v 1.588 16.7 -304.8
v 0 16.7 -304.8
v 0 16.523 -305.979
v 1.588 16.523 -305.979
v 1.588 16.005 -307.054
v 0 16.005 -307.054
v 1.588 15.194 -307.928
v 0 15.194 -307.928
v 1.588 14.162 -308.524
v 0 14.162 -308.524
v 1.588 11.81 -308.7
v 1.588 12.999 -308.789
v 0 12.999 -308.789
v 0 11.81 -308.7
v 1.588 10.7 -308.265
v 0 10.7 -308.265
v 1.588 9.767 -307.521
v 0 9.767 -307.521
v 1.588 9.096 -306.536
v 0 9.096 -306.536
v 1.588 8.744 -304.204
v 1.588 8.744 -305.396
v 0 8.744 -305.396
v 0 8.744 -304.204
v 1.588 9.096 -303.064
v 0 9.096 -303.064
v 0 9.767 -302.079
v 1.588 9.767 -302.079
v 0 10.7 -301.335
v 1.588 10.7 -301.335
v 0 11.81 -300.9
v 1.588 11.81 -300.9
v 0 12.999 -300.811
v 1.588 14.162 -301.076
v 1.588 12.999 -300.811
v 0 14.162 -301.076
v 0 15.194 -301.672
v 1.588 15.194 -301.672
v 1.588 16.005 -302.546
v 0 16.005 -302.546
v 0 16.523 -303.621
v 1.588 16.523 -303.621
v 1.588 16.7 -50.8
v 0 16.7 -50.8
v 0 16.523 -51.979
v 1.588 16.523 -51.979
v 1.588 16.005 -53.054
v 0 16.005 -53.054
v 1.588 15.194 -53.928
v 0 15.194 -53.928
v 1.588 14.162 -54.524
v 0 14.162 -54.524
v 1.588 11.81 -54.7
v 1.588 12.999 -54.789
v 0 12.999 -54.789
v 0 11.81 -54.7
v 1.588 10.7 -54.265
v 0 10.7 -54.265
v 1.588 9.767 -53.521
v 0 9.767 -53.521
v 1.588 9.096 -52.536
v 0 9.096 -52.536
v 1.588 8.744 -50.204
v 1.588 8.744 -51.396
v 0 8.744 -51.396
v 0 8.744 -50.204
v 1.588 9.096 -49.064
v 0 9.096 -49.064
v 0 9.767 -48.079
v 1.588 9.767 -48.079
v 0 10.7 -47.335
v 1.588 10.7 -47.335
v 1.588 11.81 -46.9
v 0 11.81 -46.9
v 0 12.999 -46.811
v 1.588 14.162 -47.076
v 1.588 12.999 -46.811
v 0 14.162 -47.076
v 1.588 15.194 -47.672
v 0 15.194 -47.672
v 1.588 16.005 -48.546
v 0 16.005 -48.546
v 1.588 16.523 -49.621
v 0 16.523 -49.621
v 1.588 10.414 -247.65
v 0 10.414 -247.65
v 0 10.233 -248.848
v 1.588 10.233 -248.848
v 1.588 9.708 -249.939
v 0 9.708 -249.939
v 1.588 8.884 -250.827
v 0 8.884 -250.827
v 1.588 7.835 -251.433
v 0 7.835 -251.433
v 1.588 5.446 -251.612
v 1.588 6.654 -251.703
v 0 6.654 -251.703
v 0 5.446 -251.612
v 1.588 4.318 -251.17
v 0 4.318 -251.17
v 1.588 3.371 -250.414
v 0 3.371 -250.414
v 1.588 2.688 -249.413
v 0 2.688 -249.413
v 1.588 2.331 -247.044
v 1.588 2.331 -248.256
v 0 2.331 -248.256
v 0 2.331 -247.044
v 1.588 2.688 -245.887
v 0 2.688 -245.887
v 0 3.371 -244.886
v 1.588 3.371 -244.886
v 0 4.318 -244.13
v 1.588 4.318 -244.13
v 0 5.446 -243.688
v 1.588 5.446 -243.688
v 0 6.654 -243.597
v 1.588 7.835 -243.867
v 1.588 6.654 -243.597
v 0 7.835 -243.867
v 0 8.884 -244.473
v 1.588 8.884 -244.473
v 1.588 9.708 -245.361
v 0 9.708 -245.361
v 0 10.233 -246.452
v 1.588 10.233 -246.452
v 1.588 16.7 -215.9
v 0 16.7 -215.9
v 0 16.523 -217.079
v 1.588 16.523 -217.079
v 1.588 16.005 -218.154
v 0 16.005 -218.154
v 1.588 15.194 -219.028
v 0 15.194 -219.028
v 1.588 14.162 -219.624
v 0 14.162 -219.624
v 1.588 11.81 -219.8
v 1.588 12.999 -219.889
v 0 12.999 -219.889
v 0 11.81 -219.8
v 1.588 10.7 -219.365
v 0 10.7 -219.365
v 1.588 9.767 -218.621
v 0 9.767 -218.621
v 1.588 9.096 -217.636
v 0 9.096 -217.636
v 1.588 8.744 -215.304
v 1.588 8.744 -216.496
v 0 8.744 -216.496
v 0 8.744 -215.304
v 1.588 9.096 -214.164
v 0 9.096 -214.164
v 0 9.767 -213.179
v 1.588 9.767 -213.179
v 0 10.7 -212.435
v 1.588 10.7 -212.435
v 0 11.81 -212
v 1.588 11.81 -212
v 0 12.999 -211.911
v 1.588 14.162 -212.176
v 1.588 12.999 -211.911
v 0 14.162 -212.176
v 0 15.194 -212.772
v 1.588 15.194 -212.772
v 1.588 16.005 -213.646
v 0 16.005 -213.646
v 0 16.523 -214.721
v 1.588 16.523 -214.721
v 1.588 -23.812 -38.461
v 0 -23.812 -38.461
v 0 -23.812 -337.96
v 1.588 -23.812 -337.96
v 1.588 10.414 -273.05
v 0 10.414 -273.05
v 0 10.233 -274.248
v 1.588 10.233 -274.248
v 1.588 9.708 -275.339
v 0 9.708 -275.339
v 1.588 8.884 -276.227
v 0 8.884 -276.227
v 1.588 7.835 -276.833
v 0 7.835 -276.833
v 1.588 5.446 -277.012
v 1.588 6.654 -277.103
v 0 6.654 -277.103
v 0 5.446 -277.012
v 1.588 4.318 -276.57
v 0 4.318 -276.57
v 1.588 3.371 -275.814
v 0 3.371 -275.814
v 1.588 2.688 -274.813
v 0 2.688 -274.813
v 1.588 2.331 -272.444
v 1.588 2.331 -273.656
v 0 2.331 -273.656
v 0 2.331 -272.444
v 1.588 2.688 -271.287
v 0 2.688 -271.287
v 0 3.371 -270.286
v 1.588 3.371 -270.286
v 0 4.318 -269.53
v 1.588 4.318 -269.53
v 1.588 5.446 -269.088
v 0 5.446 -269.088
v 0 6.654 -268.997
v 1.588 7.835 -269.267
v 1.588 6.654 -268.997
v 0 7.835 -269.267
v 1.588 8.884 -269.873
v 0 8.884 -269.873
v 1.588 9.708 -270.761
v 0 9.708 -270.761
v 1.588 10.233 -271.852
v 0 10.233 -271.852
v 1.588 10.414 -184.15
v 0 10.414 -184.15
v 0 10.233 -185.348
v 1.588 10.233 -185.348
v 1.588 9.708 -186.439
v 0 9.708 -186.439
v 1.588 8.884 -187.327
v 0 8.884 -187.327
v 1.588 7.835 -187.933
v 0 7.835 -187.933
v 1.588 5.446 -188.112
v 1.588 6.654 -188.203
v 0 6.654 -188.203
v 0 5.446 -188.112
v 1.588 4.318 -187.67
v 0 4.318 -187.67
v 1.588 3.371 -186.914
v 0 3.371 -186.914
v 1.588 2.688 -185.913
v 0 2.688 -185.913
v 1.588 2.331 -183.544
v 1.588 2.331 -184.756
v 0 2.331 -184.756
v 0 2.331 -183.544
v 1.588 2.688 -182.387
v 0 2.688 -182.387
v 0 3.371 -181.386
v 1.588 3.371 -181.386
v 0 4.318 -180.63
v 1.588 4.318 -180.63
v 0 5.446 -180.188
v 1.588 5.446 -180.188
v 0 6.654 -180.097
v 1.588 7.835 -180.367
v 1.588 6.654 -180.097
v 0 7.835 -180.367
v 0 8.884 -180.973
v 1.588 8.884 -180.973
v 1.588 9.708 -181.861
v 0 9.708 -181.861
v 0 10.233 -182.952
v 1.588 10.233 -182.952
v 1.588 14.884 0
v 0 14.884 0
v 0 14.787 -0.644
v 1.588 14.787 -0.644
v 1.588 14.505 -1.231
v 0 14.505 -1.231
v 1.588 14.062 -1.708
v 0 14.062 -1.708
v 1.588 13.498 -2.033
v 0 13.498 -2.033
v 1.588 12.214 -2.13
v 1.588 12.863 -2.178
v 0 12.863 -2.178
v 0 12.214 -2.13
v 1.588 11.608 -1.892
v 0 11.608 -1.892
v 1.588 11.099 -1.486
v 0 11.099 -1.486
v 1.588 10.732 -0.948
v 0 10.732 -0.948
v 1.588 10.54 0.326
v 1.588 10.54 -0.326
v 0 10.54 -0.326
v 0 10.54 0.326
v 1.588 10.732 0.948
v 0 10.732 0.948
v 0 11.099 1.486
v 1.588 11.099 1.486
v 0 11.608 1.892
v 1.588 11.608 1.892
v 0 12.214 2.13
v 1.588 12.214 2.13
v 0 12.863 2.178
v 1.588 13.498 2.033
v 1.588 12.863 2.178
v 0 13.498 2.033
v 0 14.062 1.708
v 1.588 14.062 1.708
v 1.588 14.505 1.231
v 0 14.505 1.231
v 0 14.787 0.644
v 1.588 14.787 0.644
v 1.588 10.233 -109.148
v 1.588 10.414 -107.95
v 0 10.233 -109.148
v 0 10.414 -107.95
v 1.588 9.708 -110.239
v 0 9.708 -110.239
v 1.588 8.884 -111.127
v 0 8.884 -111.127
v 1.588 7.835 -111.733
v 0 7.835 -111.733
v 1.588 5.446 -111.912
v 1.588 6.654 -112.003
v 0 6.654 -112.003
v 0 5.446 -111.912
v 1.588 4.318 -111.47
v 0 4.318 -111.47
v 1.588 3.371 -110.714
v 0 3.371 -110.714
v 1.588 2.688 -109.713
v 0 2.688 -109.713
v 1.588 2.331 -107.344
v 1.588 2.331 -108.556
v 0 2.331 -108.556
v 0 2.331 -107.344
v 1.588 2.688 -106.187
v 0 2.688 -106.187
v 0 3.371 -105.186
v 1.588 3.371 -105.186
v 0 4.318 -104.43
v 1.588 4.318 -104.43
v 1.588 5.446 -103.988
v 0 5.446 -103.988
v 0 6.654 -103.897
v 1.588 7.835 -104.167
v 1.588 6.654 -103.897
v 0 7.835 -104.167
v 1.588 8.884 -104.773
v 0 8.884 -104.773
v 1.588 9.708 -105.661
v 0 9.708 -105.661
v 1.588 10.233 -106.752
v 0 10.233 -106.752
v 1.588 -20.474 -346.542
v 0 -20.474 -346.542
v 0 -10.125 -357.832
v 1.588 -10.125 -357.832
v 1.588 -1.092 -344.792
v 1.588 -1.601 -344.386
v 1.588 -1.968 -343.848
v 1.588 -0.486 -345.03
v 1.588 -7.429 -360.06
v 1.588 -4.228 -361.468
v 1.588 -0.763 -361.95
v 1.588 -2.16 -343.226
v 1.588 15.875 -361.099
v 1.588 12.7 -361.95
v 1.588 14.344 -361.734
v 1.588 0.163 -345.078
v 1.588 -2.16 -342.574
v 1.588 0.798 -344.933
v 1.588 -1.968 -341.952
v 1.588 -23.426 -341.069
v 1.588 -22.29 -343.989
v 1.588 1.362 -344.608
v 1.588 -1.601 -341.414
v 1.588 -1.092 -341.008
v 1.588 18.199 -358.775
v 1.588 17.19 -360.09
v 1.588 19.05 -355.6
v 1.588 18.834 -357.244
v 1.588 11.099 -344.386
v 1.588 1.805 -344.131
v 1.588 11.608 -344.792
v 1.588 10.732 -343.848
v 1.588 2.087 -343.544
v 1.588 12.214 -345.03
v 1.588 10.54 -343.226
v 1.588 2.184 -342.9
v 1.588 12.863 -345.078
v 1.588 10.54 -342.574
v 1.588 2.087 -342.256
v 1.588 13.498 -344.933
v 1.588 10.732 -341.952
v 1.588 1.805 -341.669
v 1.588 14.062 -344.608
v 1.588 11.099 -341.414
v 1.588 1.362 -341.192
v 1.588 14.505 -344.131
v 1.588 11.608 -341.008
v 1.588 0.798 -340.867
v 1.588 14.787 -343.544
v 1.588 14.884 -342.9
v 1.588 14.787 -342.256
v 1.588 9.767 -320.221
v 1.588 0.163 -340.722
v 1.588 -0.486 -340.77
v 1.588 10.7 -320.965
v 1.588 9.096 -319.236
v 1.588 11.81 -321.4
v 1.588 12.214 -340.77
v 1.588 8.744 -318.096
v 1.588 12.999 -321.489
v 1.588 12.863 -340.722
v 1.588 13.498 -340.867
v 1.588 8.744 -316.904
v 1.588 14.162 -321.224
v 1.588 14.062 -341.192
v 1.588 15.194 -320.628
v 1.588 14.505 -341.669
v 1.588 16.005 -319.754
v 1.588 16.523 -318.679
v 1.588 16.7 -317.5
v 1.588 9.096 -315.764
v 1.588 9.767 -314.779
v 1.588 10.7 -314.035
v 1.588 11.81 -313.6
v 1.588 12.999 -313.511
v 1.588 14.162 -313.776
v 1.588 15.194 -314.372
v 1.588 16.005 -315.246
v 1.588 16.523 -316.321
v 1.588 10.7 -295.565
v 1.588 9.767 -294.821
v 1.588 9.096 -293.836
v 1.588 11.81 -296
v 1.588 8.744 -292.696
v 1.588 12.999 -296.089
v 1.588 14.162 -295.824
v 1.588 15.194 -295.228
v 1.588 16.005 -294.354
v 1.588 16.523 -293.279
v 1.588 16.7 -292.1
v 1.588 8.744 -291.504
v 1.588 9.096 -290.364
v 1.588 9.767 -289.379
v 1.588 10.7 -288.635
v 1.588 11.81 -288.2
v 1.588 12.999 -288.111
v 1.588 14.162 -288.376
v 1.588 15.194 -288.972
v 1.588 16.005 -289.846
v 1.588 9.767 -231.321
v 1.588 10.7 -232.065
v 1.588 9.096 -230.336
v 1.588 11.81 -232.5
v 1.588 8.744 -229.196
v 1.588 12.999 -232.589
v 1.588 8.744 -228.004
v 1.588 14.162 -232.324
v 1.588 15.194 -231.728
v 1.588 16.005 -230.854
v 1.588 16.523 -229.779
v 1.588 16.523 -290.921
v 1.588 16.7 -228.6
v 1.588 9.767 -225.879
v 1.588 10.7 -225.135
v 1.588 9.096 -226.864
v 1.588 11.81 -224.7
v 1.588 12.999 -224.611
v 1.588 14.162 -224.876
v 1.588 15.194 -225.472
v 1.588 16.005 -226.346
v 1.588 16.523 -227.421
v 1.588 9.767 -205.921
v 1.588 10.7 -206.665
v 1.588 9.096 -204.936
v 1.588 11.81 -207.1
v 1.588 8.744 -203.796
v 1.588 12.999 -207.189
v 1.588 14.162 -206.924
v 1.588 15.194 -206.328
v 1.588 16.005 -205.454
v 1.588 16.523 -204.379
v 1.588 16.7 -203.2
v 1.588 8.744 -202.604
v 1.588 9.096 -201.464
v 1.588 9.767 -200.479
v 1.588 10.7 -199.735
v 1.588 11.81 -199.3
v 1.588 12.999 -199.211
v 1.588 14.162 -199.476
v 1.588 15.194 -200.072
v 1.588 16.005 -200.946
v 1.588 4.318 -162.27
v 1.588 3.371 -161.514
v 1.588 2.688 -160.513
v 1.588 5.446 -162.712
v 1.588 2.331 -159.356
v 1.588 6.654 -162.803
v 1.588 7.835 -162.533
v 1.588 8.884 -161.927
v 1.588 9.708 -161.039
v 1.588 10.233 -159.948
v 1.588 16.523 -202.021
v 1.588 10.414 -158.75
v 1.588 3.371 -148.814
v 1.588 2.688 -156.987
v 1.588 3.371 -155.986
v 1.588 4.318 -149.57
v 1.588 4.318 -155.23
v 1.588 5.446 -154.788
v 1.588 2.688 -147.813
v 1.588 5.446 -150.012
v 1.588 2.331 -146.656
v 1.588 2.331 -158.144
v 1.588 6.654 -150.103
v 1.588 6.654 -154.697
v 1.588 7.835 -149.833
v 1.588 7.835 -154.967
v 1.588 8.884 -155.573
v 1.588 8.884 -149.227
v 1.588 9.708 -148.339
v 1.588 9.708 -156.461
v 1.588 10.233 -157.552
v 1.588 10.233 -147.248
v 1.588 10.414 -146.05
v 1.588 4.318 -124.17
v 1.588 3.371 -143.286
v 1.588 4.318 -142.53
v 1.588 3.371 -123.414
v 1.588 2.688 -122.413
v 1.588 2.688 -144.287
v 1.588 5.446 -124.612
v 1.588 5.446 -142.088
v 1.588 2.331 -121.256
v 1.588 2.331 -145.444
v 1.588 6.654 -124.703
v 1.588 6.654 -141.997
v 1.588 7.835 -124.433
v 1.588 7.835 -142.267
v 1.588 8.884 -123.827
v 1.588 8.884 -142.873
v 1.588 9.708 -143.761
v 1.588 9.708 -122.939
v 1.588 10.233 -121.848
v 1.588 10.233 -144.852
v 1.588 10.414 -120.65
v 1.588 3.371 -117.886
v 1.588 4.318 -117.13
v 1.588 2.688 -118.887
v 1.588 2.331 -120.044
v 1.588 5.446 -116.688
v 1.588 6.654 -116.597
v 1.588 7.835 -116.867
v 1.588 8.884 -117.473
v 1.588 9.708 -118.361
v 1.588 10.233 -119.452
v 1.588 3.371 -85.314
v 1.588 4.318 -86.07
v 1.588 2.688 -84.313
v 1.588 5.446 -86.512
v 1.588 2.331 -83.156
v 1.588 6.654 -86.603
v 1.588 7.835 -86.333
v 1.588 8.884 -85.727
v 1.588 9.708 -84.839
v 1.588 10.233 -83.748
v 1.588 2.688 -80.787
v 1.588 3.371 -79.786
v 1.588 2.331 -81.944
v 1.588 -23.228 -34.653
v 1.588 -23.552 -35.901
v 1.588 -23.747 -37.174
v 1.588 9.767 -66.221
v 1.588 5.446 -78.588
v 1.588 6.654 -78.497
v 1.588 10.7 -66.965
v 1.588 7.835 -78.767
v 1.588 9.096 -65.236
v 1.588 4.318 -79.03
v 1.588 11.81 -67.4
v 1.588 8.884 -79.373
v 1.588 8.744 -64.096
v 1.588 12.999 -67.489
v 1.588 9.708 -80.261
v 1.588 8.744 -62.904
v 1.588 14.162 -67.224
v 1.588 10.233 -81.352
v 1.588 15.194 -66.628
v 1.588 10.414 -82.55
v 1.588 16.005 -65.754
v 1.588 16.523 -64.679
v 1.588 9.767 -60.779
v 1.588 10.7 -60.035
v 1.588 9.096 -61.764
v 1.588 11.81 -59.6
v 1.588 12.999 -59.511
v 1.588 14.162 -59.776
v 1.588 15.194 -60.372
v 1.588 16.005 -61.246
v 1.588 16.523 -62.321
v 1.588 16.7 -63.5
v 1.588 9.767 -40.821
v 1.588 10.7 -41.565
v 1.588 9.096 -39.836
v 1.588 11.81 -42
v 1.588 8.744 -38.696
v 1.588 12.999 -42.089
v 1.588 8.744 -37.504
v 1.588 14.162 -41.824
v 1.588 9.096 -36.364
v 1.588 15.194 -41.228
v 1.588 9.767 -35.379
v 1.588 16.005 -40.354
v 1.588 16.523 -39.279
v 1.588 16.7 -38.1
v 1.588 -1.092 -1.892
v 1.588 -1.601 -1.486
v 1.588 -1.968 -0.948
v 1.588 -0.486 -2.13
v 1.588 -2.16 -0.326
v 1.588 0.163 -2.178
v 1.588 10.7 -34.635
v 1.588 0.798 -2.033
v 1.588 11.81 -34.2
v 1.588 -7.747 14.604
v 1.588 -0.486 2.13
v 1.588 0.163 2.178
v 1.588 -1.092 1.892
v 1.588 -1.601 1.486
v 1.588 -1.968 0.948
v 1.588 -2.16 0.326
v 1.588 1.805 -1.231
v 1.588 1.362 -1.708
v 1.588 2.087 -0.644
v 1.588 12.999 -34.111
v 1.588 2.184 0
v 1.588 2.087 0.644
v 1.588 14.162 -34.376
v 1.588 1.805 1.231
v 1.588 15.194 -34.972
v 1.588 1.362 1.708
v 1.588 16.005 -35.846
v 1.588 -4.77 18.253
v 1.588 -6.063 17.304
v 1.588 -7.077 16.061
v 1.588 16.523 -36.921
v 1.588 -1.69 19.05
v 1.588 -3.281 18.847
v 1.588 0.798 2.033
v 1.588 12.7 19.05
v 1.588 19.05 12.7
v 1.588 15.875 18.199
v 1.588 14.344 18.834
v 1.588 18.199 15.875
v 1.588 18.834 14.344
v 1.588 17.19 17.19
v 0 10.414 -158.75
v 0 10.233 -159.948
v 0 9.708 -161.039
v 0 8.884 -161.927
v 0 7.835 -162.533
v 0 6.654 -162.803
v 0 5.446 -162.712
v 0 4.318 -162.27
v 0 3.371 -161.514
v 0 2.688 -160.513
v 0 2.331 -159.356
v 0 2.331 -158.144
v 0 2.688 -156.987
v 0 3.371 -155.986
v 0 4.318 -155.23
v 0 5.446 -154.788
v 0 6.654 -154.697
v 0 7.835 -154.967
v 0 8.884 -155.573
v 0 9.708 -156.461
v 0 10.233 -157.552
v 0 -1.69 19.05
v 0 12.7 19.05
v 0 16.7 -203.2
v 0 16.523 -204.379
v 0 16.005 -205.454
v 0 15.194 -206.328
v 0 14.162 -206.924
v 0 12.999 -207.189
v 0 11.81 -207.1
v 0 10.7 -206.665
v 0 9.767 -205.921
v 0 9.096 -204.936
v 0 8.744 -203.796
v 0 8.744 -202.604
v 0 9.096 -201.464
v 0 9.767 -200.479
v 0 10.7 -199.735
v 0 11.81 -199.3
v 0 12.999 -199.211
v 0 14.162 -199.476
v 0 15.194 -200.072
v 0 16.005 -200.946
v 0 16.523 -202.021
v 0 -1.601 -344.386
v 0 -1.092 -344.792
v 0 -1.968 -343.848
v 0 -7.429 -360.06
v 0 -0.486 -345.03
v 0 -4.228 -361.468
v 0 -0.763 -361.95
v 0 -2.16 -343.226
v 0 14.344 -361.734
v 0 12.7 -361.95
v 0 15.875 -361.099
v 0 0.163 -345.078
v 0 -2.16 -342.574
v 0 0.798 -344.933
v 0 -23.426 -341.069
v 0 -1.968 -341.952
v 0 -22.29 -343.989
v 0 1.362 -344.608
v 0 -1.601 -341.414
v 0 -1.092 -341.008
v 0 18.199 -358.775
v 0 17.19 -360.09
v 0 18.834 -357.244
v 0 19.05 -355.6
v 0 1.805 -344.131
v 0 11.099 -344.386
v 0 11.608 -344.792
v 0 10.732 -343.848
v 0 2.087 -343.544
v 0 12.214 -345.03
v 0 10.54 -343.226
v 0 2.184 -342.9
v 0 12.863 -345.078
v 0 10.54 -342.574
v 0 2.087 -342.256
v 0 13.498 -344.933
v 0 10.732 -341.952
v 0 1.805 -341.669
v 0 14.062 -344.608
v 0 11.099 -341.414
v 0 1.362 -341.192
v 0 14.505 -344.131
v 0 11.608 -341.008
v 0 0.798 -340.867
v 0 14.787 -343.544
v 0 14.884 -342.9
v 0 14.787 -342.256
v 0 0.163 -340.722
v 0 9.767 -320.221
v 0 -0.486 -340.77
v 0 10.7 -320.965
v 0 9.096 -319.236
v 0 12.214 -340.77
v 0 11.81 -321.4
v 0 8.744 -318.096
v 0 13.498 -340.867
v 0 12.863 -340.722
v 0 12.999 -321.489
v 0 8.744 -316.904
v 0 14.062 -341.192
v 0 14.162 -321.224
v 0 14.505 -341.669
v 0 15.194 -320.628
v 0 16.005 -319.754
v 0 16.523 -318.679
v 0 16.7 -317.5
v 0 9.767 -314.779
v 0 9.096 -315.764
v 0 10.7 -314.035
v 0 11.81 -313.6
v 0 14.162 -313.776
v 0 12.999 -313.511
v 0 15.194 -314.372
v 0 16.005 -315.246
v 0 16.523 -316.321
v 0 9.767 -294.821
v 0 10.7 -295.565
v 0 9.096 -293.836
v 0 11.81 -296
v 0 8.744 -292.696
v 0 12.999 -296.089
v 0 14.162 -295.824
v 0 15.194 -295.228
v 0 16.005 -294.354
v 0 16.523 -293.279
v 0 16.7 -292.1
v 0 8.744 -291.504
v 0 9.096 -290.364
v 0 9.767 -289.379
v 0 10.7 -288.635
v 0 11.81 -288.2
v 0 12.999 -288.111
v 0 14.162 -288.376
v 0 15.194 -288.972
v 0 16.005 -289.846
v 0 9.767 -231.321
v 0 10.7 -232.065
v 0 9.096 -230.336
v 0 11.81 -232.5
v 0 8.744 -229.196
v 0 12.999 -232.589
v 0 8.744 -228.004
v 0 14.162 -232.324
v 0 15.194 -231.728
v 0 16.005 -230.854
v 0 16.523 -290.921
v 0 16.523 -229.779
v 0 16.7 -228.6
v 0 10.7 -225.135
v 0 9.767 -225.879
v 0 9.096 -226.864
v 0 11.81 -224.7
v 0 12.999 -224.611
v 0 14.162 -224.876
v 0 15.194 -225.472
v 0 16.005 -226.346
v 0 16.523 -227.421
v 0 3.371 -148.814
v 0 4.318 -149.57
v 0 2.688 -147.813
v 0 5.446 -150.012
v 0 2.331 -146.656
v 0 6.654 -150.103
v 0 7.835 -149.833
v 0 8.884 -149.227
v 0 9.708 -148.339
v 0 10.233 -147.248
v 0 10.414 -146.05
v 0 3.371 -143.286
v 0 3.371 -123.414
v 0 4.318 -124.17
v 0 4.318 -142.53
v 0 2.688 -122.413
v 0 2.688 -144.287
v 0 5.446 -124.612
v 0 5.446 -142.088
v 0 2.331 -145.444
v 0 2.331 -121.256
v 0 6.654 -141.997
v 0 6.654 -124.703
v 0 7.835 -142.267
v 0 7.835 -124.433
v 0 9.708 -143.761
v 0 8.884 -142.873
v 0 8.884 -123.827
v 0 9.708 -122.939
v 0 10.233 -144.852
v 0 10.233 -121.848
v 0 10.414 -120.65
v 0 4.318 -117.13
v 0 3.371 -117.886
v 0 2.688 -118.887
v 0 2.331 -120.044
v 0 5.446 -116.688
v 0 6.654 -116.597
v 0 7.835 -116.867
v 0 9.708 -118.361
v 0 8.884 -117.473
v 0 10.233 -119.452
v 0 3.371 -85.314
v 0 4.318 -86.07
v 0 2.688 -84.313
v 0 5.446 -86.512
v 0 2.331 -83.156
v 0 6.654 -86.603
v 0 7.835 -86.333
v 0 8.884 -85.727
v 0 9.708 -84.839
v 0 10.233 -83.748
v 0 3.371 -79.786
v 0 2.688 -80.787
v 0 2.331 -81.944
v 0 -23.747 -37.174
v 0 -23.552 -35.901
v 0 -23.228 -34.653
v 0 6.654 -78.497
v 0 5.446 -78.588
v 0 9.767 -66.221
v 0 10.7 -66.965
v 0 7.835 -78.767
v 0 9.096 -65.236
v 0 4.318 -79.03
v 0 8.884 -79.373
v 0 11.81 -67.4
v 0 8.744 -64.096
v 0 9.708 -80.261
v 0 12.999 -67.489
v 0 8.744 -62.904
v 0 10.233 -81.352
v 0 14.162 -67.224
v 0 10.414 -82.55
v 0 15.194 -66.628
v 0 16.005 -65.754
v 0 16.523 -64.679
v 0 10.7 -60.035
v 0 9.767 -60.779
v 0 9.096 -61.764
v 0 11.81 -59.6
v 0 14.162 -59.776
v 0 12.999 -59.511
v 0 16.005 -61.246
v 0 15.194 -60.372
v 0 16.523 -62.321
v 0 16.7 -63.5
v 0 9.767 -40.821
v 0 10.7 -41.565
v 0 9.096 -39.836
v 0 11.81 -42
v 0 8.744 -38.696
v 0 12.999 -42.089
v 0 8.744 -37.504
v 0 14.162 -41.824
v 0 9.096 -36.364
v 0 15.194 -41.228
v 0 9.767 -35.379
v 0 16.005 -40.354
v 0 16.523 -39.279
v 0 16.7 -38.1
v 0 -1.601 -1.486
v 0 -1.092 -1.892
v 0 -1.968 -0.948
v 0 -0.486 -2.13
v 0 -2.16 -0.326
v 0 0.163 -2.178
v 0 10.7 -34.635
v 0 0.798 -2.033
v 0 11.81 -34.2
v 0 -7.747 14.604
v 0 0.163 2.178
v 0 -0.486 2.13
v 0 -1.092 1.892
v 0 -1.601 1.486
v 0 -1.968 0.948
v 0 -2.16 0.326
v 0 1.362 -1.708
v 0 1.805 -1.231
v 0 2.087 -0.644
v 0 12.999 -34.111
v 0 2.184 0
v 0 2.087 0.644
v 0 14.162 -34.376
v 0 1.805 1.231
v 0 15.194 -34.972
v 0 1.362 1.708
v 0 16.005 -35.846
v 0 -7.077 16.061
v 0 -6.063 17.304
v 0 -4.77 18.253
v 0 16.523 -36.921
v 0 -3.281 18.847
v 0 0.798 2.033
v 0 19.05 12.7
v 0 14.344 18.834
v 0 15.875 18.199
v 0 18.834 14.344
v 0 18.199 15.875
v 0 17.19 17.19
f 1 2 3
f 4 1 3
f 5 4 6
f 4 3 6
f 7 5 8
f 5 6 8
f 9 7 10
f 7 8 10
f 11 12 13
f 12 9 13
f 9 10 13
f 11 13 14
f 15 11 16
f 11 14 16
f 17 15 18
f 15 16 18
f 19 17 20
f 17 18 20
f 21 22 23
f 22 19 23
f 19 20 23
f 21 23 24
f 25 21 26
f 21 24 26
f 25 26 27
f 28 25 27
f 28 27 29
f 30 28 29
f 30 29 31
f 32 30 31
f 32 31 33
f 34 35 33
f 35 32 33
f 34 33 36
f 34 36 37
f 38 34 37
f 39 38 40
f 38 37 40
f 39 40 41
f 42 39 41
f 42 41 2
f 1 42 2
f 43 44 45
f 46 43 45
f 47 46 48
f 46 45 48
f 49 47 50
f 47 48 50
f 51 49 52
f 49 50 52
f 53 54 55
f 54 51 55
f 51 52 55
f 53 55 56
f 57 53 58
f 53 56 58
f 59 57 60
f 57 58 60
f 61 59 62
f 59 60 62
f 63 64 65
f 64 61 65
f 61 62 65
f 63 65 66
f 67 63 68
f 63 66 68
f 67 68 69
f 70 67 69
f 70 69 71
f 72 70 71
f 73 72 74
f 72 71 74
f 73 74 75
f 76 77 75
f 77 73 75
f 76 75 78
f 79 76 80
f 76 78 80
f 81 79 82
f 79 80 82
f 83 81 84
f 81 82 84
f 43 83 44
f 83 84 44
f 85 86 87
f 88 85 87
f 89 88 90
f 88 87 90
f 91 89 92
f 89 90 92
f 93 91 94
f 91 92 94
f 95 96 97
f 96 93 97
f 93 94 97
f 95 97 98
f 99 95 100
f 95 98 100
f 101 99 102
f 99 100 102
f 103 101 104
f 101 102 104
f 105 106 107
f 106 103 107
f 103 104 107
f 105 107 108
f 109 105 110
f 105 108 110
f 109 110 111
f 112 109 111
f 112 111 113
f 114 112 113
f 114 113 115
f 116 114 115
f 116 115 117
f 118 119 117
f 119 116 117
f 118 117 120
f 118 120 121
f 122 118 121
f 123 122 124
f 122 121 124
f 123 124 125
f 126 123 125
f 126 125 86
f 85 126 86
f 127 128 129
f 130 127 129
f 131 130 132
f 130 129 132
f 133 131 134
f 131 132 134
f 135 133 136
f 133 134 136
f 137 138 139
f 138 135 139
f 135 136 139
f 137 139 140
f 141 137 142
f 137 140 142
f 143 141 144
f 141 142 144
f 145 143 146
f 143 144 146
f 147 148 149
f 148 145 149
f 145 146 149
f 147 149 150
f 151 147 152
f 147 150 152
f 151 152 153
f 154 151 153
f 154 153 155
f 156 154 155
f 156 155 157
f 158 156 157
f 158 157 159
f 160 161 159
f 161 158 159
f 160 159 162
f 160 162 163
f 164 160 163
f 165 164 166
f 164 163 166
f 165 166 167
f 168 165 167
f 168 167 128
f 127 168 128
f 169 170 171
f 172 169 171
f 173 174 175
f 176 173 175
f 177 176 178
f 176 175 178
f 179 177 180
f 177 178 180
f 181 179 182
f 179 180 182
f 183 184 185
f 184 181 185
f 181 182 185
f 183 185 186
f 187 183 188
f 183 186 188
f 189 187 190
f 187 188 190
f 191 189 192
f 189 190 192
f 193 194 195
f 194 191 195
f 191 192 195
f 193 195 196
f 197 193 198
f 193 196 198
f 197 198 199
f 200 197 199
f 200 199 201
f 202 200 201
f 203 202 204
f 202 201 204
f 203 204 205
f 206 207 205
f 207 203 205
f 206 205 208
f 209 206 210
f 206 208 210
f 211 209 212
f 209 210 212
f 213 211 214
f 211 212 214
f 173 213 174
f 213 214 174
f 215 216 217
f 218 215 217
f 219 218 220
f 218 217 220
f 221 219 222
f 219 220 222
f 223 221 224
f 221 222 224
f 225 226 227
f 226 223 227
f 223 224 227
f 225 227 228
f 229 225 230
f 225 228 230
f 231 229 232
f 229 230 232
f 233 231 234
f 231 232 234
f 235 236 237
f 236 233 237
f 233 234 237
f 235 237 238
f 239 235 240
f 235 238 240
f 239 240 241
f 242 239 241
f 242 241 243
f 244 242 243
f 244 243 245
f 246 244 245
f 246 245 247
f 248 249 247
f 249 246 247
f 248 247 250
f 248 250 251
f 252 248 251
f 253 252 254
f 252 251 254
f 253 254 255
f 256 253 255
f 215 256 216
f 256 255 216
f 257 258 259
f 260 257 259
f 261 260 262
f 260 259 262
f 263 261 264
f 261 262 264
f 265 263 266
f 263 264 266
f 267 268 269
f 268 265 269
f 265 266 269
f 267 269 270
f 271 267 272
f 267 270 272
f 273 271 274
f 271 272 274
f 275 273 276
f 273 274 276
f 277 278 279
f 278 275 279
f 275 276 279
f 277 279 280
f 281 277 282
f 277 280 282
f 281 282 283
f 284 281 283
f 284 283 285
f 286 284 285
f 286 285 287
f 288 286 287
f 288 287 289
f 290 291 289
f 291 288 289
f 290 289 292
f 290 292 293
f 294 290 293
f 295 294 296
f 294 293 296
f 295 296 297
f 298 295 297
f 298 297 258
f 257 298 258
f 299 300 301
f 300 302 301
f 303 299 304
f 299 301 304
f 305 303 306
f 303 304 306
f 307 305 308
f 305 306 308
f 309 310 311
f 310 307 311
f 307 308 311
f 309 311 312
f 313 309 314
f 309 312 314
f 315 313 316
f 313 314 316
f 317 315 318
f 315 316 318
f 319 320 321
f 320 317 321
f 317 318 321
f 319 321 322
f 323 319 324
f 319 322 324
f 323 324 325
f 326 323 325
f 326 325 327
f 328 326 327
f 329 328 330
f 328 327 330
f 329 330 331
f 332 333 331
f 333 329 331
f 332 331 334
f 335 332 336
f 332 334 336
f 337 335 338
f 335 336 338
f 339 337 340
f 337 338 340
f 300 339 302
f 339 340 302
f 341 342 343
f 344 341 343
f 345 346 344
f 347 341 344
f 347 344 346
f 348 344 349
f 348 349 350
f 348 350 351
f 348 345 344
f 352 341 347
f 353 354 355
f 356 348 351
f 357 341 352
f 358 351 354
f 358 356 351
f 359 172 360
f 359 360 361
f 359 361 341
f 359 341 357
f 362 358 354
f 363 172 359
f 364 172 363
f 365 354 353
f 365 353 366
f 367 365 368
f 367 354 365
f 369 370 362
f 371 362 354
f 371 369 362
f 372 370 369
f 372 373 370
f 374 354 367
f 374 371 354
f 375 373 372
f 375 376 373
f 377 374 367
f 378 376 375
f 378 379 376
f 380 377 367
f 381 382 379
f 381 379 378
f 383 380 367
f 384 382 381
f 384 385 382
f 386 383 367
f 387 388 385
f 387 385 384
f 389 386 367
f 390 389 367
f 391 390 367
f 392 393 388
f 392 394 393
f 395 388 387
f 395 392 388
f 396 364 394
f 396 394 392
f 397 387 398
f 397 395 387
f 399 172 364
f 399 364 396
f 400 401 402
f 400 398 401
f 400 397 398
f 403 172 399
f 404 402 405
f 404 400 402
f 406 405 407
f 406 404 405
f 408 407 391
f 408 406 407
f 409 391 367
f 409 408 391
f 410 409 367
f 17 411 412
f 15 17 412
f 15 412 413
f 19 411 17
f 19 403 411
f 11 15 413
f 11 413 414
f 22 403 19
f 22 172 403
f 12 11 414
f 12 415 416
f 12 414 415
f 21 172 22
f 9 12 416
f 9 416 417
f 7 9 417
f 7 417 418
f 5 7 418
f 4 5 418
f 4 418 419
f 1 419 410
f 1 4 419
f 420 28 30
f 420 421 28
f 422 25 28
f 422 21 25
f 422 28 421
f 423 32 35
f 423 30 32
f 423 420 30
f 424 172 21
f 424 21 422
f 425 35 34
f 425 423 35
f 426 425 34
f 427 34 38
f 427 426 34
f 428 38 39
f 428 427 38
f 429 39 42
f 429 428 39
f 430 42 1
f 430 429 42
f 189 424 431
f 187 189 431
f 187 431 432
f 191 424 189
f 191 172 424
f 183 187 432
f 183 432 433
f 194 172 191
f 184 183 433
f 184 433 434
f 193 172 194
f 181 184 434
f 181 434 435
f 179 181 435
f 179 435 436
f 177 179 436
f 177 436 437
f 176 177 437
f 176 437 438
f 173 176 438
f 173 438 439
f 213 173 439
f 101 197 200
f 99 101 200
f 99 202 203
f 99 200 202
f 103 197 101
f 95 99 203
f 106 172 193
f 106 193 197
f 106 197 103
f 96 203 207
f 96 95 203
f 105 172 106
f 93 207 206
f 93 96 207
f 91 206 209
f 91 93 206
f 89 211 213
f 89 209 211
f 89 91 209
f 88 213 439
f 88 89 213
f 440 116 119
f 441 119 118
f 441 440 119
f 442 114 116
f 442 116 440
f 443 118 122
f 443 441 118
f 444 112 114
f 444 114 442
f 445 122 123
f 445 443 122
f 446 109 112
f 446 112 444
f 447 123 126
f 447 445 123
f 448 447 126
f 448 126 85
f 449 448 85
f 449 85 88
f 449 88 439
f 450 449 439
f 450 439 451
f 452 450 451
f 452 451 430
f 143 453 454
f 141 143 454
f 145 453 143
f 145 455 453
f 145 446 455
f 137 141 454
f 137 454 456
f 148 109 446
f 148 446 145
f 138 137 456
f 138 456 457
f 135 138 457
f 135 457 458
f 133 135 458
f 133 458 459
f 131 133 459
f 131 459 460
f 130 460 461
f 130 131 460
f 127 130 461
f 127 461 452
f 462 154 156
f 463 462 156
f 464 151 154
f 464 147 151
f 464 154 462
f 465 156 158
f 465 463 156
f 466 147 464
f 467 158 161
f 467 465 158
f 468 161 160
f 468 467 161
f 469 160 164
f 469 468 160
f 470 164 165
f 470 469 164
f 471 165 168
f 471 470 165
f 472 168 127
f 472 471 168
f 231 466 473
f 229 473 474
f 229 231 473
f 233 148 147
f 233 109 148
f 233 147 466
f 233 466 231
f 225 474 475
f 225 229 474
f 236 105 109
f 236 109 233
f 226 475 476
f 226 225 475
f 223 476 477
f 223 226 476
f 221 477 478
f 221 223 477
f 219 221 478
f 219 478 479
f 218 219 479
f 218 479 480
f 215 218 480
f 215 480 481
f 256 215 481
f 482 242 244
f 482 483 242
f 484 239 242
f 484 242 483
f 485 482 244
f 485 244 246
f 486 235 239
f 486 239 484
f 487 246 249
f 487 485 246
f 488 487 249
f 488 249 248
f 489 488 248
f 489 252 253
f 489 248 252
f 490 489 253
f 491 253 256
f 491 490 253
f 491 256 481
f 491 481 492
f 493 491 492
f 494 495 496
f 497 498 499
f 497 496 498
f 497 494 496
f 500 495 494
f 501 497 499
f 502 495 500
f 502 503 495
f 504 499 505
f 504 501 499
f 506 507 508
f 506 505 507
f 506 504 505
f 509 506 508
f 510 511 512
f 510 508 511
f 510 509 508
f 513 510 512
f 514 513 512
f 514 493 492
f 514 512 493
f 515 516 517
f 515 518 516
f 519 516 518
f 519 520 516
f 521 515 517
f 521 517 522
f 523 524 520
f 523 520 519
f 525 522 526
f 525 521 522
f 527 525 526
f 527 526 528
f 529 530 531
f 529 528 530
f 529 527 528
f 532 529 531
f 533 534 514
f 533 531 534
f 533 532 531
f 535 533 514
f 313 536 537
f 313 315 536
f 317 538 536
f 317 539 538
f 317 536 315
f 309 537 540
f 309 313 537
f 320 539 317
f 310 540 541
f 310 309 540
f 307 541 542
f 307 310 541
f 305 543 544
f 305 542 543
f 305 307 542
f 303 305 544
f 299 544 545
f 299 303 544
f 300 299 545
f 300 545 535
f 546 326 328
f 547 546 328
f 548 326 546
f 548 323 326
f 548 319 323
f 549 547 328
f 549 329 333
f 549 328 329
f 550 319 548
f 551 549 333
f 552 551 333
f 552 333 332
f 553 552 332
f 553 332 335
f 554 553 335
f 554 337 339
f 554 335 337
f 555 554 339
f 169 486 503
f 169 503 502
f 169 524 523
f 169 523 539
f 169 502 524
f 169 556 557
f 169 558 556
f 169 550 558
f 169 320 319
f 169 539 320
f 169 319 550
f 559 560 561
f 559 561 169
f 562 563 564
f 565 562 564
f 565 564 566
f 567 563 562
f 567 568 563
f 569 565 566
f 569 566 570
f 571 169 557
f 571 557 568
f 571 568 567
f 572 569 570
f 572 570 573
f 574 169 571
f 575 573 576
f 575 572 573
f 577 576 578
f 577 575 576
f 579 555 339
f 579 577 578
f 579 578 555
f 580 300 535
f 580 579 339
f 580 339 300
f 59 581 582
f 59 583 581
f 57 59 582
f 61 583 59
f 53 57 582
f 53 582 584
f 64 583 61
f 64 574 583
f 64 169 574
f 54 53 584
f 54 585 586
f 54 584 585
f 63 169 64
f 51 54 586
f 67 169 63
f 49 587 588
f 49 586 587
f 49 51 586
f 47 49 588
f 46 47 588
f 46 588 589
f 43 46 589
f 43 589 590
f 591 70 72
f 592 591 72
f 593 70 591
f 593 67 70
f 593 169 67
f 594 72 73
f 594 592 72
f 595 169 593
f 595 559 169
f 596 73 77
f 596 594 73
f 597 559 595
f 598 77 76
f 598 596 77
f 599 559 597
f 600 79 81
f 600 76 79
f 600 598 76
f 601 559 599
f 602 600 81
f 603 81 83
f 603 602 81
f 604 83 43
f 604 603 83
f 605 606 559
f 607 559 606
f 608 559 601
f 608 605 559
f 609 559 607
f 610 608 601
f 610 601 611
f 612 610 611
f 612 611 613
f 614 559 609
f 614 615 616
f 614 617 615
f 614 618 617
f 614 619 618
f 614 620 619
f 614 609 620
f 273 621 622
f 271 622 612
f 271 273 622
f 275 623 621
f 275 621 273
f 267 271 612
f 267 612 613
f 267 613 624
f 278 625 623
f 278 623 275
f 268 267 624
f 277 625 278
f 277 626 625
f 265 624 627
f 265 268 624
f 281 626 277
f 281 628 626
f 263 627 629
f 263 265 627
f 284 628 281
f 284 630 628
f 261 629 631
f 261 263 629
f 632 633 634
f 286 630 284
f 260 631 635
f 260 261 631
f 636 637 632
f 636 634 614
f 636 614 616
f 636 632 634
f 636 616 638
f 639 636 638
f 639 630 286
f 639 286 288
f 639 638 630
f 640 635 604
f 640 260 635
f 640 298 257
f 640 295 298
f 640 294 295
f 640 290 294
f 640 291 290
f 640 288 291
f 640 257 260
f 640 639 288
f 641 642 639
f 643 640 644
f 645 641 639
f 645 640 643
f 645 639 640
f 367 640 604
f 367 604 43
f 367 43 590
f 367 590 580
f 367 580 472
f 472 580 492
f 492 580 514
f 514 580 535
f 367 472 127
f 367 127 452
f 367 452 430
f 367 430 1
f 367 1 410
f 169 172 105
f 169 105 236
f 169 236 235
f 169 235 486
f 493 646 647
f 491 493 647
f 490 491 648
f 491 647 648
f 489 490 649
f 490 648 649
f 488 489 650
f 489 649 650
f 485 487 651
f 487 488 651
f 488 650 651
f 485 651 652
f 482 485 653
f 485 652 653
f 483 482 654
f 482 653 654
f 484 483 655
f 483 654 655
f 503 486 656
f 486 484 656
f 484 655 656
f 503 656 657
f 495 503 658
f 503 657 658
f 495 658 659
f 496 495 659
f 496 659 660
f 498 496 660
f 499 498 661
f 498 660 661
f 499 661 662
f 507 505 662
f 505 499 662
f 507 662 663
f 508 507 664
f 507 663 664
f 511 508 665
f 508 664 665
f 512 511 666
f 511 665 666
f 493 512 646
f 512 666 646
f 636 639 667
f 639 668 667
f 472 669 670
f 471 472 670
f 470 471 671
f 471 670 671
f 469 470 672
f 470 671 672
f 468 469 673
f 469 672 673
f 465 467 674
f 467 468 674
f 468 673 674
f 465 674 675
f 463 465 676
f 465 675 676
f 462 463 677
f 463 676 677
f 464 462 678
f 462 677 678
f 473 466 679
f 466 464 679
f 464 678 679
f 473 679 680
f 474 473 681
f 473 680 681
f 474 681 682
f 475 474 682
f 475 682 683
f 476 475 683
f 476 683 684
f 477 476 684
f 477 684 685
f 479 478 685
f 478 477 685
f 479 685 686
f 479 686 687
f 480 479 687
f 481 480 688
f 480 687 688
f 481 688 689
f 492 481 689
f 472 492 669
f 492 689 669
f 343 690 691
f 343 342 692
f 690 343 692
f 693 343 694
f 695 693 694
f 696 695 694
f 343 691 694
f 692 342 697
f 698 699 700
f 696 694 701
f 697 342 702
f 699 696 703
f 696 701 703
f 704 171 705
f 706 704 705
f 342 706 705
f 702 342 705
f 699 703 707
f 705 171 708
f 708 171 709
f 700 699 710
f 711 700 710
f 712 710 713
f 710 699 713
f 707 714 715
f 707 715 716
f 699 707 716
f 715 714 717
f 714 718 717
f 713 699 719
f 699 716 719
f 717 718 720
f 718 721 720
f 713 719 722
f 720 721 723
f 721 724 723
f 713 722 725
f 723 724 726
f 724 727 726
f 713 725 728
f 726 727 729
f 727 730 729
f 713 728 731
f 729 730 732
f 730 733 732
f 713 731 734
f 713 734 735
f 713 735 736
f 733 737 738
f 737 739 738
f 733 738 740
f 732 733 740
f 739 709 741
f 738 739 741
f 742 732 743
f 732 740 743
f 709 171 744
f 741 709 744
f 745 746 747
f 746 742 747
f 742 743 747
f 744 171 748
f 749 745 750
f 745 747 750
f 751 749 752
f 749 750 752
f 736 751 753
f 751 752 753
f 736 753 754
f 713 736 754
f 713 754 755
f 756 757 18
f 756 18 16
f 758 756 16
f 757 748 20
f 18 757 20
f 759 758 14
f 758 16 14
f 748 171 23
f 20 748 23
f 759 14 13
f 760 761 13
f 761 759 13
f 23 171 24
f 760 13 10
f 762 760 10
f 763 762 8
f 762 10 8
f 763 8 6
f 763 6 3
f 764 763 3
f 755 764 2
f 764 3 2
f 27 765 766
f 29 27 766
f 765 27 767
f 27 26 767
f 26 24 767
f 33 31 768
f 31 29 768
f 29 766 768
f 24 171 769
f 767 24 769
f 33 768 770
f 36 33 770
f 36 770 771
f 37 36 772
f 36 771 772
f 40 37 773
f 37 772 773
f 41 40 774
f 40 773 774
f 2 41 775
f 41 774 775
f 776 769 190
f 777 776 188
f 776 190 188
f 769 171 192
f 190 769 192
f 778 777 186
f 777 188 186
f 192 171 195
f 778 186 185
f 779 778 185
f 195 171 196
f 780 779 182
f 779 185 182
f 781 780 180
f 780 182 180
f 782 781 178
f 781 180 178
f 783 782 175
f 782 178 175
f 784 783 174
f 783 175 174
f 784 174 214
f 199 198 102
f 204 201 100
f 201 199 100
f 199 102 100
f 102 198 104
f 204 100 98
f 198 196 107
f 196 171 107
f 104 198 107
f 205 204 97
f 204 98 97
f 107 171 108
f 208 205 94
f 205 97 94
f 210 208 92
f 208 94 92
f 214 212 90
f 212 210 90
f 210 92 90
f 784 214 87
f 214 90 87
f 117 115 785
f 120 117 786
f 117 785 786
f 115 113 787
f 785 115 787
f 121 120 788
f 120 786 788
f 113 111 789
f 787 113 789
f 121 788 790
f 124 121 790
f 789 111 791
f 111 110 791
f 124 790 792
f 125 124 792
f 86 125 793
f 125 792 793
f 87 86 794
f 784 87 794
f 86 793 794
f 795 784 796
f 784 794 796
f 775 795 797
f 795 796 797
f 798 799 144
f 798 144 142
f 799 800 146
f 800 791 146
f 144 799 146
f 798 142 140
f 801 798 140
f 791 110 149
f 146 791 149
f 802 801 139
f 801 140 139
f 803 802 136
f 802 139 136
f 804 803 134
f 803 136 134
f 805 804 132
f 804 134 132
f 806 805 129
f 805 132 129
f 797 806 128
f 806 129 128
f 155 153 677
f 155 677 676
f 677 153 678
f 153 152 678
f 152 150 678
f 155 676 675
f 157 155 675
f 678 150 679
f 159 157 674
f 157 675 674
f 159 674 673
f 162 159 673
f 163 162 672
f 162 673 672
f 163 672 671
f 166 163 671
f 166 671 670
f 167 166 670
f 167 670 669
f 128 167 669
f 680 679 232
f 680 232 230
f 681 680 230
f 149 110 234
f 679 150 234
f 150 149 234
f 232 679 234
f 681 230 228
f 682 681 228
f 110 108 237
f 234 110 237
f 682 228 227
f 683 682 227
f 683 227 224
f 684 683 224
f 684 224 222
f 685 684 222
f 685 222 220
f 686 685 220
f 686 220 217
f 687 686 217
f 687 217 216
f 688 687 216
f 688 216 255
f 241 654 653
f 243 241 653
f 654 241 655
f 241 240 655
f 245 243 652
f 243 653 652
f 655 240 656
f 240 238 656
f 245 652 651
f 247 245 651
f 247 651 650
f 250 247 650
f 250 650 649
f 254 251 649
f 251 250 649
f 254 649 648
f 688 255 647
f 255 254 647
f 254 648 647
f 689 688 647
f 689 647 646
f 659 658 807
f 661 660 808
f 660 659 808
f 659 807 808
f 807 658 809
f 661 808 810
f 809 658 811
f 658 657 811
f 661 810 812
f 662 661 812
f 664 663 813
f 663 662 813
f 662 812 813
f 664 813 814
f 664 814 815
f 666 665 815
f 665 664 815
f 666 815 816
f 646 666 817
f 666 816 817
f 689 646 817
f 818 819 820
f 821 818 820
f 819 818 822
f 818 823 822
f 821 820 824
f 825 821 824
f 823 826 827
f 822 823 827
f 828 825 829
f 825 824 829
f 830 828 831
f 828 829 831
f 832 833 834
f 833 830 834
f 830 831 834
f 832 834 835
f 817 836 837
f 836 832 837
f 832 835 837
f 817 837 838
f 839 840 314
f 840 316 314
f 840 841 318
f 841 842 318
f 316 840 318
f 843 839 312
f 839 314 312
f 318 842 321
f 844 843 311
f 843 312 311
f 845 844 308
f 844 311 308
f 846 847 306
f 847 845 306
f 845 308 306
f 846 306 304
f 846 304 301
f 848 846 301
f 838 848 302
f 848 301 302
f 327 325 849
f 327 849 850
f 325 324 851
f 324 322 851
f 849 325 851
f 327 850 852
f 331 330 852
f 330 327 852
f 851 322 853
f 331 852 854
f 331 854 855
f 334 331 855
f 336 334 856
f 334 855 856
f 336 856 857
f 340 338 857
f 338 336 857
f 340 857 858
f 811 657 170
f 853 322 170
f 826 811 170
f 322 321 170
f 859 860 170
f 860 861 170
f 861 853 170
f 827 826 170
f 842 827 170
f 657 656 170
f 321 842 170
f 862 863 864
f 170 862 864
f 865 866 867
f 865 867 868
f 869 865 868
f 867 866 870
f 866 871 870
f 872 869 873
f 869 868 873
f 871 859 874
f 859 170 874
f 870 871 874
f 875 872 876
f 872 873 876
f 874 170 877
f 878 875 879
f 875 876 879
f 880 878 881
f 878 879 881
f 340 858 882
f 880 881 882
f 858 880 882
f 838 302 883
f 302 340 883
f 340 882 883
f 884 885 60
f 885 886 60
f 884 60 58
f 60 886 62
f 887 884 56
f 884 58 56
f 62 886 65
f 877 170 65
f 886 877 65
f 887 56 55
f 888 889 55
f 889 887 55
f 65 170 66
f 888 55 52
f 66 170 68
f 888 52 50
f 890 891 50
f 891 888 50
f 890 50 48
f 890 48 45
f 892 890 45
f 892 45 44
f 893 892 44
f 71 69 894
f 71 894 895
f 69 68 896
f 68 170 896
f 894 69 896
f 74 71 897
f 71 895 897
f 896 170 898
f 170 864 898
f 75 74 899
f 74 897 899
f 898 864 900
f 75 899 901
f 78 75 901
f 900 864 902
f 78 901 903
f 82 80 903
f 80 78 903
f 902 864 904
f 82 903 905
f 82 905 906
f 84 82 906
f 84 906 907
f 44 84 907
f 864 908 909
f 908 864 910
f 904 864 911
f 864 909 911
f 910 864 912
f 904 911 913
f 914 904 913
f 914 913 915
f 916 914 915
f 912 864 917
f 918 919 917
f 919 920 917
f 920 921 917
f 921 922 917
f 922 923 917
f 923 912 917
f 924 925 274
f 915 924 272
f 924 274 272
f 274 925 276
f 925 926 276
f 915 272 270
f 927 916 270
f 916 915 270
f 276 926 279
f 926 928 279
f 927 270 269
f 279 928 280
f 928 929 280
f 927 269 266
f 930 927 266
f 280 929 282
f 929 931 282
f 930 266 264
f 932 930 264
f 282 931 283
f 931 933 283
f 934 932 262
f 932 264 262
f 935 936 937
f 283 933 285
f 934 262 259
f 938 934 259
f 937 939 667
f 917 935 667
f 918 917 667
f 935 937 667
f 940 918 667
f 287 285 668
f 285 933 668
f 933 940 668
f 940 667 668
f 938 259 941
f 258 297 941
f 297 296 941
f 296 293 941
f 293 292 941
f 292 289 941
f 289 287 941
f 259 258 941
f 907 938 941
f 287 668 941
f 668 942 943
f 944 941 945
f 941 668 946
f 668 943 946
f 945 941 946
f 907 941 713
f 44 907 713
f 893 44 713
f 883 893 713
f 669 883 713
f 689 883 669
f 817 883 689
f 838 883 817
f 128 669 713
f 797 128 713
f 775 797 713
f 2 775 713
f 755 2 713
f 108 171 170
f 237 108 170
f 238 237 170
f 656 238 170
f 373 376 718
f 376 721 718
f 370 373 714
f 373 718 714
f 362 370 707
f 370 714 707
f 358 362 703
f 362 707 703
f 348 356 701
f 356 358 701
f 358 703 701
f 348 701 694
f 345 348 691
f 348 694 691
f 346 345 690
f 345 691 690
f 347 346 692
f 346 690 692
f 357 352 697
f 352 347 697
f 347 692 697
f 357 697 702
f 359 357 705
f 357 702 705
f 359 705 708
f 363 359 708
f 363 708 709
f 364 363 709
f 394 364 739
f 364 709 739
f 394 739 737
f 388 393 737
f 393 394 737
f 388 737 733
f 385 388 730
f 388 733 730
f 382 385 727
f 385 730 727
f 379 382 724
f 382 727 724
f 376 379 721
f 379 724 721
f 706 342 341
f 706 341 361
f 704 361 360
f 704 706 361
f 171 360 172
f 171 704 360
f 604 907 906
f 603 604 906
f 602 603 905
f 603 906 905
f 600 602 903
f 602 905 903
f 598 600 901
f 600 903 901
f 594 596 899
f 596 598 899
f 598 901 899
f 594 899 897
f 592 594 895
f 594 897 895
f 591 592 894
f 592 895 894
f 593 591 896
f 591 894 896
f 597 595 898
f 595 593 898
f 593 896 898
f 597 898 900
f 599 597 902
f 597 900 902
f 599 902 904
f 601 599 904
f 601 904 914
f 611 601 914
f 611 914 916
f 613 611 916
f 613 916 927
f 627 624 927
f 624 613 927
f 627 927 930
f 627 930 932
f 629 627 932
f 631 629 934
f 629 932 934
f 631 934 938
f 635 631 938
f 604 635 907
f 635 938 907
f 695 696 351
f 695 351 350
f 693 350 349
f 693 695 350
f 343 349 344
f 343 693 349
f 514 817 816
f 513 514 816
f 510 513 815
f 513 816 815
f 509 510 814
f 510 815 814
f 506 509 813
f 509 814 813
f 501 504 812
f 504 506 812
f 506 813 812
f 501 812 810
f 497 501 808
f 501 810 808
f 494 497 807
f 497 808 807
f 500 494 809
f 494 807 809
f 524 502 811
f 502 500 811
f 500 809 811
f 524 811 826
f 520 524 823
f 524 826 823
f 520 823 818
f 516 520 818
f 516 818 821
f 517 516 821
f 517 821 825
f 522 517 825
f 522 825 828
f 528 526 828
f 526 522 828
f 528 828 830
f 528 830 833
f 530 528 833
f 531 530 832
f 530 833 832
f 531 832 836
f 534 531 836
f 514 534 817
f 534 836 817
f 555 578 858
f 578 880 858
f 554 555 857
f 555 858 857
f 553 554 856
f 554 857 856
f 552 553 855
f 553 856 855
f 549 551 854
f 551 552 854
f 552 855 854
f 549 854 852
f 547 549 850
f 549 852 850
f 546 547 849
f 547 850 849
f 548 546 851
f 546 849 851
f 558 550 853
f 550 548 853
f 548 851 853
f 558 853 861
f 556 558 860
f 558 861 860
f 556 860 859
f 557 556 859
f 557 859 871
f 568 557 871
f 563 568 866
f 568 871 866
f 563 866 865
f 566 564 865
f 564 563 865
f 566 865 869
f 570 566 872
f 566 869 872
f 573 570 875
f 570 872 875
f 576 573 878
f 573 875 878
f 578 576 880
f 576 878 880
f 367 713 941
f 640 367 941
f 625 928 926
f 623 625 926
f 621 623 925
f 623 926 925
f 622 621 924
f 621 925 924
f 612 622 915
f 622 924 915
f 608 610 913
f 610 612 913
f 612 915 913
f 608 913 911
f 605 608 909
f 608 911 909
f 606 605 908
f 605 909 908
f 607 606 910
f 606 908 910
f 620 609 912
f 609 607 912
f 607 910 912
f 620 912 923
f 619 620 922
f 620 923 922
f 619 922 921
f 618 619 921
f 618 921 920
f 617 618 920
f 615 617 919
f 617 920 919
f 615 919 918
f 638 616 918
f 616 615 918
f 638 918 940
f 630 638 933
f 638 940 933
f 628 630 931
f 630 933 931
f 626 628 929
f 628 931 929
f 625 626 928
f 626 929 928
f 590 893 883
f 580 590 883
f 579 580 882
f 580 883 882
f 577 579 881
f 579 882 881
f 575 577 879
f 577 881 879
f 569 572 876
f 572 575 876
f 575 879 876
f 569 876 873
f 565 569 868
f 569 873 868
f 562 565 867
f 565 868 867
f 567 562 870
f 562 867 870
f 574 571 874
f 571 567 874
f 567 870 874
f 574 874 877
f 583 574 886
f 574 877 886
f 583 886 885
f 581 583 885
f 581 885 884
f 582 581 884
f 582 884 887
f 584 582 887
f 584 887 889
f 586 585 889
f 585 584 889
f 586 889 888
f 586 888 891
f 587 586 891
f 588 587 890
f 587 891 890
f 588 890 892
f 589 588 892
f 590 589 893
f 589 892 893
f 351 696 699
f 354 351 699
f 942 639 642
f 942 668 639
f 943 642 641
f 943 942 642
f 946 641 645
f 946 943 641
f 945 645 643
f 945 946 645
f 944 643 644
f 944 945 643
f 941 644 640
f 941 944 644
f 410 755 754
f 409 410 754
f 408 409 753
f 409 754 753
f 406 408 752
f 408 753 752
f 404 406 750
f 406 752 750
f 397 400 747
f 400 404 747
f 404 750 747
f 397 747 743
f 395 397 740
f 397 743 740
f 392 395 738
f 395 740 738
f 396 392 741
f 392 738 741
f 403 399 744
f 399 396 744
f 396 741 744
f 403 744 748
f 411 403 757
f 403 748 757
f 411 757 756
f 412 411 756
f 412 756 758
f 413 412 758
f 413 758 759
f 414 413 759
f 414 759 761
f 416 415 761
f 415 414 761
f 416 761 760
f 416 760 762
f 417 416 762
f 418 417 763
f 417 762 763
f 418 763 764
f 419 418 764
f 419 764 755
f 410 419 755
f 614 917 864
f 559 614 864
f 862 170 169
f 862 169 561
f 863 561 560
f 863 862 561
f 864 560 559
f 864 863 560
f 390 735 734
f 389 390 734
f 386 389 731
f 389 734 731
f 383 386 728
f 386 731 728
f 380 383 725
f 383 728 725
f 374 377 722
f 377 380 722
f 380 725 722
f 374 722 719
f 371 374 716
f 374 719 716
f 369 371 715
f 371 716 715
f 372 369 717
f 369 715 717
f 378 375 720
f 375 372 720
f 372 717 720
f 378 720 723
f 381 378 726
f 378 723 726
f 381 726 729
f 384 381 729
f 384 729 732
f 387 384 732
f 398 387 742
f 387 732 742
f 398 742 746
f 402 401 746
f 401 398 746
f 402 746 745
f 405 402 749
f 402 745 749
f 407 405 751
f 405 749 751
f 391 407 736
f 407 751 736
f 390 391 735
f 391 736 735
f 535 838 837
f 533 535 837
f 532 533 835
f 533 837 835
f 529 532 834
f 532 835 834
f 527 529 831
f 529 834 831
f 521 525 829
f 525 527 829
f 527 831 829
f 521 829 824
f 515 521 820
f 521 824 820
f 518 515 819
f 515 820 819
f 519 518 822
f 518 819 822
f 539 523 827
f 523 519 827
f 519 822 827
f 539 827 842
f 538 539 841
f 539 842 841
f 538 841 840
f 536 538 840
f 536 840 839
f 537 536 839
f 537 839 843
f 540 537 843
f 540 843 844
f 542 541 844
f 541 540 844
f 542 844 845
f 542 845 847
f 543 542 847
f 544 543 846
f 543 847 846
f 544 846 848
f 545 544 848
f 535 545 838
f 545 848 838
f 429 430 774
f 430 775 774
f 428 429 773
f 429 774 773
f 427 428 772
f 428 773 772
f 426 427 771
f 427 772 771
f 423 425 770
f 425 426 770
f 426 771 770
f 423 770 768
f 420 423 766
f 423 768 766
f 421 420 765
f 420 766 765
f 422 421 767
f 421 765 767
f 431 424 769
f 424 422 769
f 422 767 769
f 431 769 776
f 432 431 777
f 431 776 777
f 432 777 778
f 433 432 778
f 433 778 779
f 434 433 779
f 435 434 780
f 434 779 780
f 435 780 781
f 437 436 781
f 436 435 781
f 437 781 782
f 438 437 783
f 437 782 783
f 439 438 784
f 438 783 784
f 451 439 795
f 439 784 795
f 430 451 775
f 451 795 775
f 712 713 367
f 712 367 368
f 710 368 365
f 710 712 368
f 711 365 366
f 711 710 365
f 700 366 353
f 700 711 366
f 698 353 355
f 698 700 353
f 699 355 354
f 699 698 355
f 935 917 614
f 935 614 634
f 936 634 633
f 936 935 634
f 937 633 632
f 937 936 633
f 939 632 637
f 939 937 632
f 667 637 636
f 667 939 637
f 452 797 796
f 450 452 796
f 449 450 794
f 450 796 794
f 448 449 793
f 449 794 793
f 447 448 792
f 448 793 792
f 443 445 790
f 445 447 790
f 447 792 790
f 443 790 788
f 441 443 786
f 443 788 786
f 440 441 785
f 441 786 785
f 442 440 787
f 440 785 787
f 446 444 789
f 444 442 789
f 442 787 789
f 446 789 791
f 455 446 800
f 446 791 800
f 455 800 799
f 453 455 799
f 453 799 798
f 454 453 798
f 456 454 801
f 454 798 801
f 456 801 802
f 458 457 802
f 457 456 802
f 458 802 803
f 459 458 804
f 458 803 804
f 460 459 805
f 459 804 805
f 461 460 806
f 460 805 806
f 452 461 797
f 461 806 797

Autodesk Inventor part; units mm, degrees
ref_plane "YZ Plane" through (0, 0, 0) normal (1, 0, 0) x (0, 1, 0)
ref_plane "XZ Plane" through (0, 0, 0) normal (0, 1, 0) x (-1, 0, 0)
ref_plane "XY Plane" through (0, 0, 0) normal (0, 0, 1) x (1, 0, 0)
sketch "main" plane through (0, 0, 0) normal (0, 0, 1) x (1, 0, 0)
  circle A0 centre (10.1168, 23.8511) radius 4.064
  circle A1 centre (10.1168, 11.1511) radius 4.064
  circle A2 centre (10.1168, -14.2489) radius 4.064
  circle A3 centre (16.4668, -33.2989) radius 4.0005
  circle A4 centre (16.4668, -58.6989) radius 4.0005
  circle A5 centre (10.1168, -77.7489) radius 4.064
  circle A6 centre (3.7668, 169.9011) radius 2.1844
  circle A7 centre (16.4668, 169.9011) radius 2.1844
  circle A8 centre (10.1168, -103.1489) radius 4.064
  circle A9 centre (16.4668, -122.1989) radius 4.0005
  circle A10 centre (3.7668, -172.9989) radius 2.1844
  circle A11 centre (16.4668, -172.9989) radius 2.1844
  line L0 (-20.0457, 131.4398) -> (-20.0457, -168.0589)
  line L1 (22.8168, -185.6989) -> (22.8168, 182.6011)
  line L2 (-16.7075, -176.6406) -> (-6.3583, -187.9307)
  line L3 (3.0036, -192.0489) -> (16.4668, -192.0489)
  arc A12 (-20.0457, -168.0589) -> (-16.7075, -176.6406) centre (-7.3457, -168.0589) ccw
  arc A13 (-6.3583, -187.9307) -> (3.0036, -192.0489) centre (3.0036, -179.3489) ccw
  circle A14 centre (16.4668, -147.5989) radius 4.0005
  arc A15 (16.4668, -192.0489) -> (22.8168, -185.6989) centre (16.4668, -185.6989) ccw
  line L4 (16.4668, 188.9511) -> (2.0773, 188.9511)
  line L5 (-3.9805, 184.505) -> (-19.4614, 135.2476)
  arc A16 (-19.4614, 135.2476) -> (-20.0457, 131.4398) centre (-7.3457, 131.4398) ccw
  circle A17 centre (10.1168, 49.2511) radius 4.064
  circle A18 centre (10.1168, 61.9511) radius 4.064
  circle A19 centre (10.1168, 87.3511) radius 4.064
  circle A20 centre (16.4668, 106.4011) radius 4.0005
  circle A21 centre (16.4668, 131.8011) radius 4.0005
  arc A22 (22.8168, 182.6011) -> (16.4668, 188.9511) centre (16.4668, 182.6011) ccw
  arc A23 (2.0773, 188.9511) -> (-3.9805, 184.505) centre (2.0773, 182.6011) ccw
  circle A24 centre (16.4668, 119.1011) radius 4.0005
  circle A25 centre (16.4668, -45.9989) radius 4.0005
  circle A26 centre (16.4668, -134.8989) radius 4.0005
  point P0 (5.8318, -6.3003)
  dimension "d16" = 12.7
  dimension "d17" = 6.35
  dimension "d18" = 6.35
  dimension "d19" = 8.001
  dimension "d20" = 25.4
  dimension "d21" = 165.1
  dimension "d22" = 254
  dimension "d23" = 8.128
  dimension "d24" = 25.4
  dimension "d25" = 38.1
  dimension "d26" = 25.4
sketch "Sketch1" plane through (0, 0, 0) normal (1, 0, 0) x (0, 1, 0)
  circle A0 centre (6.35, -146.05) radius 4.064
  circle A1 centre (6.35, -158.75) radius 4.064
  circle A2 centre (6.35, -184.15) radius 4.064
  circle A3 centre (12.7, -203.2) radius 4.0005
  circle A4 centre (12.7, -228.6) radius 4.0005
  circle A5 centre (6.35, -247.65) radius 4.064
  circle A6 centre (0, 0) radius 2.1844
  circle A7 centre (12.7, 0) radius 2.1844
  circle A8 centre (6.35, -273.05) radius 4.064
  circle A9 centre (12.7, -292.1) radius 4.0005
  circle A10 centre (0, -342.9) radius 2.1844
  circle A11 centre (12.7, -342.9) radius 2.1844
  line L0 (-23.8125, -38.4612) -> (-23.8125, -337.9599)
  line L1 (19.05, -355.6) -> (19.05, 12.7)
  line L2 (-20.4744, -346.5416) -> (-10.1251, -357.8317)
  line L3 (-0.7632, -361.95) -> (12.7, -361.95)
  arc A12 (-23.8125, -337.9599) -> (-20.4744, -346.5416) centre (-11.1125, -337.9599) ccw
  arc A13 (-10.1251, -357.8317) -> (-0.7632, -361.95) centre (-0.7632, -349.25) ccw
  circle A14 centre (12.7, -317.5) radius 4.0005
  arc A15 (12.7, -361.95) -> (19.05, -355.6) centre (12.7, -355.6) ccw
  line L4 (12.7, 19.05) -> (-1.6895, 19.05)
  line L5 (-7.7473, 14.6039) -> (-23.2282, -34.6534)
  arc A16 (-23.2282, -34.6534) -> (-23.8125, -38.4612) centre (-11.1125, -38.4612) ccw
  circle A17 centre (6.35, -120.65) radius 4.064
  circle A18 centre (6.35, -107.95) radius 4.064
  circle A19 centre (6.35, -82.55) radius 4.064
  circle A20 centre (12.7, -63.5) radius 4.0005
  circle A21 centre (12.7, -38.1) radius 4.0005
  arc A22 (19.05, 12.7) -> (12.7, 19.05) centre (12.7, 12.7) ccw
  arc A23 (-1.6895, 19.05) -> (-7.7473, 14.6039) centre (-1.6895, 12.7) ccw
  circle A24 centre (12.7, -50.8) radius 4.0005
  circle A25 centre (12.7, -215.9) radius 4.0005
  circle A26 centre (12.7, -304.8) radius 4.0005
extrude "Extrusion1" add sketch "Sketch1" along normal blind 1.5875
properties part number "Skirt" material "Acetal Resin, White"
